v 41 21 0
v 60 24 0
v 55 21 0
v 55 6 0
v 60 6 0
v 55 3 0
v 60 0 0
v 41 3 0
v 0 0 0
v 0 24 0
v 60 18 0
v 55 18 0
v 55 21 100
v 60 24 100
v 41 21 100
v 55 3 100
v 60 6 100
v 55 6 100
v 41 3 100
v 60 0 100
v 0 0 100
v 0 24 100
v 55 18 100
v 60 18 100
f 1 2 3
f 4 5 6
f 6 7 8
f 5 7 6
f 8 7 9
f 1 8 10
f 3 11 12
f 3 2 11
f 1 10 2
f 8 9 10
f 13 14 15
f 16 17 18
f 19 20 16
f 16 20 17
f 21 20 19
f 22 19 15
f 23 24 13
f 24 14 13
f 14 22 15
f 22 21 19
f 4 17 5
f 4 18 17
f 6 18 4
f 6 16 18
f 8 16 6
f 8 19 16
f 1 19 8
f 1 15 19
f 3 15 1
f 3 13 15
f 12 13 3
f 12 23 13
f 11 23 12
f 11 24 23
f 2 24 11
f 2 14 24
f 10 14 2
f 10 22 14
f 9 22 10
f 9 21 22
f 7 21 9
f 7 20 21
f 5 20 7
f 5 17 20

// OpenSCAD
$fn = 32;

// ----------------------------------------------------------------------
// T-slot rail: 60 x 24 mm section, 100 mm long
// ----------------------------------------------------------------------

// --- parameters (mm) ---
profile_height = 100;     // extrusion height
profile_points = 12;      // points of the closed outline

profile = [[0, 0], [60, 0], [60, 6], [55, 6], [55, 3], [41, 3], [41, 21], [55, 21], [55, 18], [60, 18], [60, 24], [0, 24]];  // single closed polygon, 12 points, counter clockwise

// --- the one profile operation ---
linear_extrude(height = profile_height) polygon(points = profile);
